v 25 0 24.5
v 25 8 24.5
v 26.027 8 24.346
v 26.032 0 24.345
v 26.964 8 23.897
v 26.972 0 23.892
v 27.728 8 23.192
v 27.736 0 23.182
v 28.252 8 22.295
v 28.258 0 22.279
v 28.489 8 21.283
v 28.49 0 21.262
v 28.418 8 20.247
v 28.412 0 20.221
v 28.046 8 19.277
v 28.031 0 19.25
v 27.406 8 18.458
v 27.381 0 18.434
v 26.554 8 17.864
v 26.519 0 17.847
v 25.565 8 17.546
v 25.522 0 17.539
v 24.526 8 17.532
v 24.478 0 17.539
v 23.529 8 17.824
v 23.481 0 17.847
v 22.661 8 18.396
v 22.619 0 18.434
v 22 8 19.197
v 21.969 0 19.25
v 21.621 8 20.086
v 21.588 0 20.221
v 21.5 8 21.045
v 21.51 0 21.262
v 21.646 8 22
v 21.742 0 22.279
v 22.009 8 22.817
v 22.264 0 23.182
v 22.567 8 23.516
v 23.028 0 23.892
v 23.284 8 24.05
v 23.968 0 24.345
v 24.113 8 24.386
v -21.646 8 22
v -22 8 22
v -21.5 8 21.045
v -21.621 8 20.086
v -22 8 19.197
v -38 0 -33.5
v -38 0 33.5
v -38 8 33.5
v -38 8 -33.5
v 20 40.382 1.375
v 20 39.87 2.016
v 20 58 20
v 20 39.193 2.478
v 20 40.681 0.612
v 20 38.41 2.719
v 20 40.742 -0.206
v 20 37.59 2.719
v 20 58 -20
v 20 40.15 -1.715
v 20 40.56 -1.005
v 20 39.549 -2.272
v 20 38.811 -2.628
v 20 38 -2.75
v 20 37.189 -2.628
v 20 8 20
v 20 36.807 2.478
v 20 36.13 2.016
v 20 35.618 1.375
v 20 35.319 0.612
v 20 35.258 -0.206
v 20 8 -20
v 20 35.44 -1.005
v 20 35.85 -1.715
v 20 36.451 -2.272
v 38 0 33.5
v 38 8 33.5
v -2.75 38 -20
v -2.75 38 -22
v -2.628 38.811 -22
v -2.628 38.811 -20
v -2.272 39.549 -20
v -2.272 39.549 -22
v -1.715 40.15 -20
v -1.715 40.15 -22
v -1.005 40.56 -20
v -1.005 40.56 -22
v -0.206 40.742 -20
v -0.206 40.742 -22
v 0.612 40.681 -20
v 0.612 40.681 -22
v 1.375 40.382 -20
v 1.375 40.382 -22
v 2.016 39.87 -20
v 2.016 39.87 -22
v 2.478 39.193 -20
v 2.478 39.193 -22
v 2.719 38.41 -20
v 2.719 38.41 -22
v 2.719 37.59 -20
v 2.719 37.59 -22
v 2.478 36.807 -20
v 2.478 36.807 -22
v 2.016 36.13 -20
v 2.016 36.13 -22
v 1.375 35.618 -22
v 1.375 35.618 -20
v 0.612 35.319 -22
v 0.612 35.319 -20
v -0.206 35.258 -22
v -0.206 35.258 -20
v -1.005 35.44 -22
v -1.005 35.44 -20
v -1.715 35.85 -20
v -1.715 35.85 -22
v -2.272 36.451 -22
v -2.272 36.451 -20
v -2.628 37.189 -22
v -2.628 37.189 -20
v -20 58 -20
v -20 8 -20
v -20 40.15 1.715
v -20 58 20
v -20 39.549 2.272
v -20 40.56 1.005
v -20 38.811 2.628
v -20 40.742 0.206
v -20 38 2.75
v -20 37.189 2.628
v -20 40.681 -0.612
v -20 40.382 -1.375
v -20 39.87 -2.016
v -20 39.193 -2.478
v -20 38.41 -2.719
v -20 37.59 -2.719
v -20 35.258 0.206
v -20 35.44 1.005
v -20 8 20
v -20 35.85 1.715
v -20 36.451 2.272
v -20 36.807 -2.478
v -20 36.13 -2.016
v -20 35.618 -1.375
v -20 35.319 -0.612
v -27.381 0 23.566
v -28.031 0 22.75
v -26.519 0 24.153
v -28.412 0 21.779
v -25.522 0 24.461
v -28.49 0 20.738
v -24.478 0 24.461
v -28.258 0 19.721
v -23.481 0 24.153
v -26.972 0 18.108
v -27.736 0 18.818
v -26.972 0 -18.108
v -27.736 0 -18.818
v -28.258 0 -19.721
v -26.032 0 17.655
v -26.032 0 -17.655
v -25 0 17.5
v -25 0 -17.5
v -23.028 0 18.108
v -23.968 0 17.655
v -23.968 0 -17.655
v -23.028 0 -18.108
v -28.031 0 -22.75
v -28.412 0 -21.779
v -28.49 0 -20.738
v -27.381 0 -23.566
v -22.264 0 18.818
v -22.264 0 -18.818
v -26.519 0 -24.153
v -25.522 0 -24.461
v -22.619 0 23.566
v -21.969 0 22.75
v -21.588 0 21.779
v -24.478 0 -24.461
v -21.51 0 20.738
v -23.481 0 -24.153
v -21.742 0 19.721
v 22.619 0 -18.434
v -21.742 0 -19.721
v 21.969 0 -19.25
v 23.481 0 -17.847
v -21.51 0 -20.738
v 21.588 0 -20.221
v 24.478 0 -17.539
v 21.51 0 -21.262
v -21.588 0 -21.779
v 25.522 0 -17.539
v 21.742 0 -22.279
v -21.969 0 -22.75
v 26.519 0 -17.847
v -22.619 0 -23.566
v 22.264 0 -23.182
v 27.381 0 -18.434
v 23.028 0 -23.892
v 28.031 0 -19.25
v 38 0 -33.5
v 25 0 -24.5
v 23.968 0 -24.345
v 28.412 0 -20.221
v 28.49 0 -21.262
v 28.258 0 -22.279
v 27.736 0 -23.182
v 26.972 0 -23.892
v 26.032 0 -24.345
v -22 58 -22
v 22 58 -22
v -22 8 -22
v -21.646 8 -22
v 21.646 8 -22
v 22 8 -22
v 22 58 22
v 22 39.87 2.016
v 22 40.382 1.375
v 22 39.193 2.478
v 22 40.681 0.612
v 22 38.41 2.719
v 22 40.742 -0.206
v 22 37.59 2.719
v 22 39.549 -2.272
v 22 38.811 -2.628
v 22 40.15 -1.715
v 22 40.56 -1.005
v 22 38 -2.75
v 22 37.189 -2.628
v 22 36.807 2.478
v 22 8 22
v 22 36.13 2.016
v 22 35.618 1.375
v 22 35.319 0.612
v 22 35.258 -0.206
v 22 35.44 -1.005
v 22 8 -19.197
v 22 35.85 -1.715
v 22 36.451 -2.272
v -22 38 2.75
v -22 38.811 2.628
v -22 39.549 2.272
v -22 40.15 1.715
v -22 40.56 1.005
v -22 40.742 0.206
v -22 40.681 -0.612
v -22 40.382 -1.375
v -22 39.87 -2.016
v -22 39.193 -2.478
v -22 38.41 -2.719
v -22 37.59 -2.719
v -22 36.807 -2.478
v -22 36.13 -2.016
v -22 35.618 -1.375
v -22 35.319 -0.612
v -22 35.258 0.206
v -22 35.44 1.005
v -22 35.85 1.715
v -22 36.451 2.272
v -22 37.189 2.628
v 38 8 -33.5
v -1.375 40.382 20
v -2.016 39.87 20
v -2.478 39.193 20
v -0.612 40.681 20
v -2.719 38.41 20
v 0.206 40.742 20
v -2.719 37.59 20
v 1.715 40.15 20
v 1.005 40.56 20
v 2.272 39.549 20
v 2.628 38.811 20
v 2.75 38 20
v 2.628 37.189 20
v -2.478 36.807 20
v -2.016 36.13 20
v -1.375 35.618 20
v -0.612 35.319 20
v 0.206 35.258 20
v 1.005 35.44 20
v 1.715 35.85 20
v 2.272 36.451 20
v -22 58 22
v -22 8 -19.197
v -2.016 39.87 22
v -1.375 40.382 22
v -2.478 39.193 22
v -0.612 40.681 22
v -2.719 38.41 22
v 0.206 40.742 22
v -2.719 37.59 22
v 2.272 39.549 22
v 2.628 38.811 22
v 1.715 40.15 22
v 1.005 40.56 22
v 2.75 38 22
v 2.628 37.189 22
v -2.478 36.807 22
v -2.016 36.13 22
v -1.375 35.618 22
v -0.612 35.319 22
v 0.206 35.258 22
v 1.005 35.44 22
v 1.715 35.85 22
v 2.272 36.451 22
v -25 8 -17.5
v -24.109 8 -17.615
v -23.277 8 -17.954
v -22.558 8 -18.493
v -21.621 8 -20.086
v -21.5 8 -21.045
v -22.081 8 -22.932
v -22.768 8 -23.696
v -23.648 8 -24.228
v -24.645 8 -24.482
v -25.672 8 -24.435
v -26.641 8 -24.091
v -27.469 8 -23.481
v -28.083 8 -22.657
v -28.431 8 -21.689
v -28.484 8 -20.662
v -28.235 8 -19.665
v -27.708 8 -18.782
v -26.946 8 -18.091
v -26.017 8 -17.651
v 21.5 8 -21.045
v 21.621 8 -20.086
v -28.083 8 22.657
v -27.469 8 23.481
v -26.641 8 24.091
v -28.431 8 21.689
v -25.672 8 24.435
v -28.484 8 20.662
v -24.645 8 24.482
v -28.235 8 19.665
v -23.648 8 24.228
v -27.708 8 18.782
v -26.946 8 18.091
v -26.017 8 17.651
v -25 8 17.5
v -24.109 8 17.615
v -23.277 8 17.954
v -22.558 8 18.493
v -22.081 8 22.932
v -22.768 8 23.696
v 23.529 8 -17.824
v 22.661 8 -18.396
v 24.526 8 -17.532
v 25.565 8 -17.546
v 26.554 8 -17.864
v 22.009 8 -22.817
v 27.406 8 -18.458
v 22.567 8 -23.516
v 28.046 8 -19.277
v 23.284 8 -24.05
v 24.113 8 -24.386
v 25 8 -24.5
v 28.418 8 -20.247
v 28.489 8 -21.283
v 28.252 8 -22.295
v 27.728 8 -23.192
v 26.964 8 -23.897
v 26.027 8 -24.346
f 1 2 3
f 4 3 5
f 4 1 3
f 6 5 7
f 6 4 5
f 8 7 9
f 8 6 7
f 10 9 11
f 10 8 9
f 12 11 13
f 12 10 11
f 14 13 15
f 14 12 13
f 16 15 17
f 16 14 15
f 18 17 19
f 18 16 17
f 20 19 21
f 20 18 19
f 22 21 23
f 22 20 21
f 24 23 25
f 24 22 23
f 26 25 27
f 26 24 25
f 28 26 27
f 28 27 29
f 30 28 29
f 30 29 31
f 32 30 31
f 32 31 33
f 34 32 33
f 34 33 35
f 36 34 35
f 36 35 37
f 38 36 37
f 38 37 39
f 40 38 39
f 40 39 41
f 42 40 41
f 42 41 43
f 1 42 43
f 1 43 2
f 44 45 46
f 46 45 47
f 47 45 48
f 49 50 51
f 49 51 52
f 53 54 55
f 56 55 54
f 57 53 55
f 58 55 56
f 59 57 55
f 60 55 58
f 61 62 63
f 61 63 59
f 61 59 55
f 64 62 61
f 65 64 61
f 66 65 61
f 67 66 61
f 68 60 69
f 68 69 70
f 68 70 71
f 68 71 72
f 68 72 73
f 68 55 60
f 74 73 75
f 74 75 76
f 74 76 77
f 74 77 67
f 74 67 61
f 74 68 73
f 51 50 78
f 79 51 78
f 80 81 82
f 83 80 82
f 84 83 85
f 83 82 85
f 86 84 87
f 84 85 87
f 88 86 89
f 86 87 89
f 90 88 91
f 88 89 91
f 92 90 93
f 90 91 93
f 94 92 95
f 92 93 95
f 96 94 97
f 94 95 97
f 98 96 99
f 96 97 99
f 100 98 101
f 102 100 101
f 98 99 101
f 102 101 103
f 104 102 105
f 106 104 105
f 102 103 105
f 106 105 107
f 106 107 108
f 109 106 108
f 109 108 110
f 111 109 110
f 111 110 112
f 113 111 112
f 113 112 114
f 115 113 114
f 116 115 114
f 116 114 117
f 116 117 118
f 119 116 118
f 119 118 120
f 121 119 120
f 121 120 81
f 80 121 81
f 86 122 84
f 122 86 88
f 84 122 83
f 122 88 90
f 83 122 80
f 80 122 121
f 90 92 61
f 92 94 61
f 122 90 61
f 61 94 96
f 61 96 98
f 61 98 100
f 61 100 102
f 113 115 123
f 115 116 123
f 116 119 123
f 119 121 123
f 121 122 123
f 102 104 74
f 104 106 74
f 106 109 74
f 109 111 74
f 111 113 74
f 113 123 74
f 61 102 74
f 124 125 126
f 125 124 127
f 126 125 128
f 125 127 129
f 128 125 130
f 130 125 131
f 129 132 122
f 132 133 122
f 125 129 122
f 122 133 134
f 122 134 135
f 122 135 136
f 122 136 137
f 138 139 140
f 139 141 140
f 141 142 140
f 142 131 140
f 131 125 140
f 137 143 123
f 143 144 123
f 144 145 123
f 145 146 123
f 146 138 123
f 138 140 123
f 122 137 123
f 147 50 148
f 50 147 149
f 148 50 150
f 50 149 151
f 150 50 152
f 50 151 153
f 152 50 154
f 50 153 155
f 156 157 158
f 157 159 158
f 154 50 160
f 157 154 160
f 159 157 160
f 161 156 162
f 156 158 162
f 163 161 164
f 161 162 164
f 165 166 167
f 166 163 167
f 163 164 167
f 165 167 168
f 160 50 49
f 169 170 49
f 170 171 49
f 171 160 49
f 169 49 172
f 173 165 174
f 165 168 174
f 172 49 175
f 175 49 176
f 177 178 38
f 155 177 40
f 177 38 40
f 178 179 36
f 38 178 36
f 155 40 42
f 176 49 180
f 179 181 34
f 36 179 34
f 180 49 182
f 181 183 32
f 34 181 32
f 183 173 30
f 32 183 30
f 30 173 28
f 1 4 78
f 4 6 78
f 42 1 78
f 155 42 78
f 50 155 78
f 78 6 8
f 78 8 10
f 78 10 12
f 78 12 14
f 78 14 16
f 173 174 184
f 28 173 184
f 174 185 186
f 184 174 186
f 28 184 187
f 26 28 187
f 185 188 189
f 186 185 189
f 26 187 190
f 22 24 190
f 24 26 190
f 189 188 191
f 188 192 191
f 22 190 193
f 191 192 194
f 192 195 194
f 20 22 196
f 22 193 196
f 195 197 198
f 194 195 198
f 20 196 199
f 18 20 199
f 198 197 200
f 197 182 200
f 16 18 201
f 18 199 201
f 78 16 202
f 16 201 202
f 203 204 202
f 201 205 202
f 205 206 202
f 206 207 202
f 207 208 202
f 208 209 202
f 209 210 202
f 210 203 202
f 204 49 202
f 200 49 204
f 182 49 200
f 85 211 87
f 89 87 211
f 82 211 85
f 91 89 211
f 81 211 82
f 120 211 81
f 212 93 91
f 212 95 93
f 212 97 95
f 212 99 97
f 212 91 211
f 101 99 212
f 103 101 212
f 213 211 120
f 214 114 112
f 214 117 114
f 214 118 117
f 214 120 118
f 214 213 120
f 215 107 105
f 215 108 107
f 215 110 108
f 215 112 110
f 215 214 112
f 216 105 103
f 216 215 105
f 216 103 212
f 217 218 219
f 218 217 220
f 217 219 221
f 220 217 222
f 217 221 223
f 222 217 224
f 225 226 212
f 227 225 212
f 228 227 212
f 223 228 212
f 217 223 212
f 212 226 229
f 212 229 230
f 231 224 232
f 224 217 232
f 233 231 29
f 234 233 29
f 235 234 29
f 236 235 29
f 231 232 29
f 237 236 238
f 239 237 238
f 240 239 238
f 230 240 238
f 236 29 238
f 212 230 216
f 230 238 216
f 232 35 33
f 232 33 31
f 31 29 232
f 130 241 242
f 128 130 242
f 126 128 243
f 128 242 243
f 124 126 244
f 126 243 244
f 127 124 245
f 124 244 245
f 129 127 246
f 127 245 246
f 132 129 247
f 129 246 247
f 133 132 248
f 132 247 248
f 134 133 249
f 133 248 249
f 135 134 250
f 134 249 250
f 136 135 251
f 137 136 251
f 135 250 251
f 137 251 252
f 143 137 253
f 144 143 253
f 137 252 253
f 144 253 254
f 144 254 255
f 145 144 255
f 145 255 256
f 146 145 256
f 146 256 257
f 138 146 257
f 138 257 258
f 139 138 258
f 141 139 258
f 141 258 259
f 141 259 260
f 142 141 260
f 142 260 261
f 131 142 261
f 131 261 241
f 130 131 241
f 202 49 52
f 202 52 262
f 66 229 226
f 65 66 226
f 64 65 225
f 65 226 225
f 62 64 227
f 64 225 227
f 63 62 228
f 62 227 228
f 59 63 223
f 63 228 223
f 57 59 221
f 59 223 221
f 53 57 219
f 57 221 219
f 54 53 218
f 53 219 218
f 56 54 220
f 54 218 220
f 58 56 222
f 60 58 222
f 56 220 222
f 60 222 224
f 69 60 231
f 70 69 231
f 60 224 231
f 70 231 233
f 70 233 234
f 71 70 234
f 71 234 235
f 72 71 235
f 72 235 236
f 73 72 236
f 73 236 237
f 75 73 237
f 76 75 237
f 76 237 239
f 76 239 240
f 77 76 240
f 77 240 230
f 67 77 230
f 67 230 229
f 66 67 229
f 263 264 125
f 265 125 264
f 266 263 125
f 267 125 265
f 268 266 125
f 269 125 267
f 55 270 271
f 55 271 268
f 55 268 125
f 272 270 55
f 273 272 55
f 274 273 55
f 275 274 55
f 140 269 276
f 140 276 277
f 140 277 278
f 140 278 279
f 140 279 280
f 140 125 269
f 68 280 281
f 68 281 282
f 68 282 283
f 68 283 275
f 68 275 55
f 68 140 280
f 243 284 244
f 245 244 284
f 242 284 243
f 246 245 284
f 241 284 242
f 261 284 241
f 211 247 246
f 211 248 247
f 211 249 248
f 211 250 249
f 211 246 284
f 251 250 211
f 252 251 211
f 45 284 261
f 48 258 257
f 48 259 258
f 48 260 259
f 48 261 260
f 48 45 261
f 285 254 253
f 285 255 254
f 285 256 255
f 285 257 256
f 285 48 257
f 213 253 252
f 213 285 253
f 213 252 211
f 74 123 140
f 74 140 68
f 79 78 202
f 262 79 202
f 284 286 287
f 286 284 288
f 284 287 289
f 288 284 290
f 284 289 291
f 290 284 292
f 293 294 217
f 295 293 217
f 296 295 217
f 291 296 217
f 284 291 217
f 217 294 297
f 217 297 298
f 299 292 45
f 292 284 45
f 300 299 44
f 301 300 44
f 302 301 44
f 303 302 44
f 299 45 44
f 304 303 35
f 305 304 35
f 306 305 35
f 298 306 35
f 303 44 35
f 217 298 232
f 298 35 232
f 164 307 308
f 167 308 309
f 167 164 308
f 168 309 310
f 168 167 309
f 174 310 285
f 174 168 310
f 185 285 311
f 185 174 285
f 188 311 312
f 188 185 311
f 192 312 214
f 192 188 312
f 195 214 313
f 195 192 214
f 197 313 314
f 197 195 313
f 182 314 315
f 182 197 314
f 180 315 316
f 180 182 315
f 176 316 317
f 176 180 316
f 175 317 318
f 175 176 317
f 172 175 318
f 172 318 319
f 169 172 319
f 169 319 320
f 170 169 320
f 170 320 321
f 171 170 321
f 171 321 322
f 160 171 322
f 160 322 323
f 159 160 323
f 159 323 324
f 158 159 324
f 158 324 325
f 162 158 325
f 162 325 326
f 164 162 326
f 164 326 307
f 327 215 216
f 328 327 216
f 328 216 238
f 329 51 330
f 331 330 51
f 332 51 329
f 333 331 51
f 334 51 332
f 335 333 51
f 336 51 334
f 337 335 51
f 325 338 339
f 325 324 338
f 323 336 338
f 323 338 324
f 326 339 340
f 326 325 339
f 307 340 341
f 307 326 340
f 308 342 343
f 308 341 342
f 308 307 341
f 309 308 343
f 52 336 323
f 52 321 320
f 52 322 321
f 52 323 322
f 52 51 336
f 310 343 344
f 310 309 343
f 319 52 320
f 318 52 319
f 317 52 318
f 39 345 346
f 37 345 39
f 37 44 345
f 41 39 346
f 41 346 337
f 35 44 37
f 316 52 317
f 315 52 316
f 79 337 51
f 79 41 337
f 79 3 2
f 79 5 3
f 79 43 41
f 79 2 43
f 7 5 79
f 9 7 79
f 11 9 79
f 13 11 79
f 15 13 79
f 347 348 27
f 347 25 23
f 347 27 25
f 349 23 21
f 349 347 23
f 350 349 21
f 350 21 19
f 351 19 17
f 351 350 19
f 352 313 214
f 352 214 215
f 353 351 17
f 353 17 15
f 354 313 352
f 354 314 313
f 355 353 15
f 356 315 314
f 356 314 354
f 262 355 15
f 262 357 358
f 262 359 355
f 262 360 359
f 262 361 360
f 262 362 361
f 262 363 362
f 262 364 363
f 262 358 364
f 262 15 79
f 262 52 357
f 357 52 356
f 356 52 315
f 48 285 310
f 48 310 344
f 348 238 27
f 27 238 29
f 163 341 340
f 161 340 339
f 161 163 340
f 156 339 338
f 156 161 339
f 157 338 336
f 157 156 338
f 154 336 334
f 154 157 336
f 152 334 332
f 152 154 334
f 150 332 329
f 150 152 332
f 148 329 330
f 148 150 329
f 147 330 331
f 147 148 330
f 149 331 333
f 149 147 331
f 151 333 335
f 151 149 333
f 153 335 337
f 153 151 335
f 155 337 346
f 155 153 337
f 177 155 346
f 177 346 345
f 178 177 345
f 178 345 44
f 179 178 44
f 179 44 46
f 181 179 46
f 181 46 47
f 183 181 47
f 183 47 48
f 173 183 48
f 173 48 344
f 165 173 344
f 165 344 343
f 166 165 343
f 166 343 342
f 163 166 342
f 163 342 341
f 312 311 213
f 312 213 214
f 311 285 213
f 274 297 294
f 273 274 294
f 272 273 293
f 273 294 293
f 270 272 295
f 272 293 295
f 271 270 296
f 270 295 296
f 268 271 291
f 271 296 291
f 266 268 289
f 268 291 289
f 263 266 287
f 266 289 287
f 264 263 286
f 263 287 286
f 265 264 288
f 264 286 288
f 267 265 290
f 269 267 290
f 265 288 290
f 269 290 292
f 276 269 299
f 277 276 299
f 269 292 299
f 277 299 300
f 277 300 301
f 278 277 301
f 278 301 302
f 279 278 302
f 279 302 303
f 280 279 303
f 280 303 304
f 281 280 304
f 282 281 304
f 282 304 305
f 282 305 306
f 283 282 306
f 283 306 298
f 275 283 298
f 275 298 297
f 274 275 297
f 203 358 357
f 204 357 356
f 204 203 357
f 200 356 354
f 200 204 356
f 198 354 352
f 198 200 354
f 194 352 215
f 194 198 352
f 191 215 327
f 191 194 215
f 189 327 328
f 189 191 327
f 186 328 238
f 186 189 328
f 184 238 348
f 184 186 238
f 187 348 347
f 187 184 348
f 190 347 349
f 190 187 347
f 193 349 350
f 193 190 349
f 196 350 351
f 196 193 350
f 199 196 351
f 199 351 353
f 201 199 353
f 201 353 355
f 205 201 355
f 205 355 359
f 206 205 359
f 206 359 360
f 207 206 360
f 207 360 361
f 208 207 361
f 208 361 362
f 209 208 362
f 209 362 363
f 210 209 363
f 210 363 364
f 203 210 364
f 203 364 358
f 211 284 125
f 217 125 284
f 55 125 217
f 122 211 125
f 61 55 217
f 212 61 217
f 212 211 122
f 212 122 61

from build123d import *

# Parameters (mm, degrees)
SKETCH_1_W               = 76
SKETCH_1_H               = 67
SKETCH_1_R               = 3.5
EXTRUDE_1_DEPTH          = 8
SKETCH_2_W               = 44
SKETCH_2_H               = 44
SKETCH_2_W_2             = 40
SKETCH_2_H_2             = 40
EXTRUDE_1_2_DEPTH        = 50
CUT_EXTRUDE_1_REACH      = 90.816
SKETCH_3_R               = 2.75
PATTERN_CIRCULAR_1_COUNT = 4


with BuildPart() as part:
    # Эскиз1 → Extrude 1 (new body)
    with BuildSketch(Plane(origin=(0, 0, 0), x_dir=(1, 0, 0), z_dir=(0, 1, 0))):
        Rectangle(SKETCH_1_W, SKETCH_1_H)
        with Locations((-25, 21)):
            Circle(SKETCH_1_R, mode=Mode.SUBTRACT)
        with Locations((25, 21)):
            Circle(SKETCH_1_R, mode=Mode.SUBTRACT)
        with Locations((25, -21)):
            Circle(SKETCH_1_R, mode=Mode.SUBTRACT)
        with Locations((-25, -21)):
            Circle(SKETCH_1_R, mode=Mode.SUBTRACT)
    extrude(amount=EXTRUDE_1_DEPTH)

    # Эскиз2 → Extrude 1 2 (add)
    with BuildSketch(Plane(origin=(0, 8, 0), x_dir=(1, 0, 0), z_dir=(0, 1, 0))):
        Rectangle(SKETCH_2_W, SKETCH_2_H)
        Rectangle(SKETCH_2_W_2, SKETCH_2_H_2, mode=Mode.SUBTRACT)
    extrude(amount=EXTRUDE_1_2_DEPTH)

    # Эскиз3 → Вырез-Вытянуть1 (cut, up to next)
    with BuildSketch(Plane.XY.offset(22), mode=Mode.PRIVATE) as cut_extrude_1_sk1:
        with Locations((0, 38)):
            Circle(SKETCH_3_R)
    cut_extrude_1_tool1 = extrude(cut_extrude_1_sk1.sketch, amount=-CUT_EXTRUDE_1_REACH, mode=Mode.PRIVATE) & part.part
    cut_extrude_1 = cut_extrude_1_tool1.solids().sort_by_distance((0, 38, 22))[0]
    add(cut_extrude_1, mode=Mode.SUBTRACT)

    # Круговой массив1: Вырез-Вытянуть1 ×4 about axis
    pattern_circular_1_axis = Axis((0, 55, 0), (0, -1, 0))
    for i in range(1, PATTERN_CIRCULAR_1_COUNT):
        add(cut_extrude_1.rotate(pattern_circular_1_axis, i * 360 / PATTERN_CIRCULAR_1_COUNT), mode=Mode.SUBTRACT)


solid = part.part
